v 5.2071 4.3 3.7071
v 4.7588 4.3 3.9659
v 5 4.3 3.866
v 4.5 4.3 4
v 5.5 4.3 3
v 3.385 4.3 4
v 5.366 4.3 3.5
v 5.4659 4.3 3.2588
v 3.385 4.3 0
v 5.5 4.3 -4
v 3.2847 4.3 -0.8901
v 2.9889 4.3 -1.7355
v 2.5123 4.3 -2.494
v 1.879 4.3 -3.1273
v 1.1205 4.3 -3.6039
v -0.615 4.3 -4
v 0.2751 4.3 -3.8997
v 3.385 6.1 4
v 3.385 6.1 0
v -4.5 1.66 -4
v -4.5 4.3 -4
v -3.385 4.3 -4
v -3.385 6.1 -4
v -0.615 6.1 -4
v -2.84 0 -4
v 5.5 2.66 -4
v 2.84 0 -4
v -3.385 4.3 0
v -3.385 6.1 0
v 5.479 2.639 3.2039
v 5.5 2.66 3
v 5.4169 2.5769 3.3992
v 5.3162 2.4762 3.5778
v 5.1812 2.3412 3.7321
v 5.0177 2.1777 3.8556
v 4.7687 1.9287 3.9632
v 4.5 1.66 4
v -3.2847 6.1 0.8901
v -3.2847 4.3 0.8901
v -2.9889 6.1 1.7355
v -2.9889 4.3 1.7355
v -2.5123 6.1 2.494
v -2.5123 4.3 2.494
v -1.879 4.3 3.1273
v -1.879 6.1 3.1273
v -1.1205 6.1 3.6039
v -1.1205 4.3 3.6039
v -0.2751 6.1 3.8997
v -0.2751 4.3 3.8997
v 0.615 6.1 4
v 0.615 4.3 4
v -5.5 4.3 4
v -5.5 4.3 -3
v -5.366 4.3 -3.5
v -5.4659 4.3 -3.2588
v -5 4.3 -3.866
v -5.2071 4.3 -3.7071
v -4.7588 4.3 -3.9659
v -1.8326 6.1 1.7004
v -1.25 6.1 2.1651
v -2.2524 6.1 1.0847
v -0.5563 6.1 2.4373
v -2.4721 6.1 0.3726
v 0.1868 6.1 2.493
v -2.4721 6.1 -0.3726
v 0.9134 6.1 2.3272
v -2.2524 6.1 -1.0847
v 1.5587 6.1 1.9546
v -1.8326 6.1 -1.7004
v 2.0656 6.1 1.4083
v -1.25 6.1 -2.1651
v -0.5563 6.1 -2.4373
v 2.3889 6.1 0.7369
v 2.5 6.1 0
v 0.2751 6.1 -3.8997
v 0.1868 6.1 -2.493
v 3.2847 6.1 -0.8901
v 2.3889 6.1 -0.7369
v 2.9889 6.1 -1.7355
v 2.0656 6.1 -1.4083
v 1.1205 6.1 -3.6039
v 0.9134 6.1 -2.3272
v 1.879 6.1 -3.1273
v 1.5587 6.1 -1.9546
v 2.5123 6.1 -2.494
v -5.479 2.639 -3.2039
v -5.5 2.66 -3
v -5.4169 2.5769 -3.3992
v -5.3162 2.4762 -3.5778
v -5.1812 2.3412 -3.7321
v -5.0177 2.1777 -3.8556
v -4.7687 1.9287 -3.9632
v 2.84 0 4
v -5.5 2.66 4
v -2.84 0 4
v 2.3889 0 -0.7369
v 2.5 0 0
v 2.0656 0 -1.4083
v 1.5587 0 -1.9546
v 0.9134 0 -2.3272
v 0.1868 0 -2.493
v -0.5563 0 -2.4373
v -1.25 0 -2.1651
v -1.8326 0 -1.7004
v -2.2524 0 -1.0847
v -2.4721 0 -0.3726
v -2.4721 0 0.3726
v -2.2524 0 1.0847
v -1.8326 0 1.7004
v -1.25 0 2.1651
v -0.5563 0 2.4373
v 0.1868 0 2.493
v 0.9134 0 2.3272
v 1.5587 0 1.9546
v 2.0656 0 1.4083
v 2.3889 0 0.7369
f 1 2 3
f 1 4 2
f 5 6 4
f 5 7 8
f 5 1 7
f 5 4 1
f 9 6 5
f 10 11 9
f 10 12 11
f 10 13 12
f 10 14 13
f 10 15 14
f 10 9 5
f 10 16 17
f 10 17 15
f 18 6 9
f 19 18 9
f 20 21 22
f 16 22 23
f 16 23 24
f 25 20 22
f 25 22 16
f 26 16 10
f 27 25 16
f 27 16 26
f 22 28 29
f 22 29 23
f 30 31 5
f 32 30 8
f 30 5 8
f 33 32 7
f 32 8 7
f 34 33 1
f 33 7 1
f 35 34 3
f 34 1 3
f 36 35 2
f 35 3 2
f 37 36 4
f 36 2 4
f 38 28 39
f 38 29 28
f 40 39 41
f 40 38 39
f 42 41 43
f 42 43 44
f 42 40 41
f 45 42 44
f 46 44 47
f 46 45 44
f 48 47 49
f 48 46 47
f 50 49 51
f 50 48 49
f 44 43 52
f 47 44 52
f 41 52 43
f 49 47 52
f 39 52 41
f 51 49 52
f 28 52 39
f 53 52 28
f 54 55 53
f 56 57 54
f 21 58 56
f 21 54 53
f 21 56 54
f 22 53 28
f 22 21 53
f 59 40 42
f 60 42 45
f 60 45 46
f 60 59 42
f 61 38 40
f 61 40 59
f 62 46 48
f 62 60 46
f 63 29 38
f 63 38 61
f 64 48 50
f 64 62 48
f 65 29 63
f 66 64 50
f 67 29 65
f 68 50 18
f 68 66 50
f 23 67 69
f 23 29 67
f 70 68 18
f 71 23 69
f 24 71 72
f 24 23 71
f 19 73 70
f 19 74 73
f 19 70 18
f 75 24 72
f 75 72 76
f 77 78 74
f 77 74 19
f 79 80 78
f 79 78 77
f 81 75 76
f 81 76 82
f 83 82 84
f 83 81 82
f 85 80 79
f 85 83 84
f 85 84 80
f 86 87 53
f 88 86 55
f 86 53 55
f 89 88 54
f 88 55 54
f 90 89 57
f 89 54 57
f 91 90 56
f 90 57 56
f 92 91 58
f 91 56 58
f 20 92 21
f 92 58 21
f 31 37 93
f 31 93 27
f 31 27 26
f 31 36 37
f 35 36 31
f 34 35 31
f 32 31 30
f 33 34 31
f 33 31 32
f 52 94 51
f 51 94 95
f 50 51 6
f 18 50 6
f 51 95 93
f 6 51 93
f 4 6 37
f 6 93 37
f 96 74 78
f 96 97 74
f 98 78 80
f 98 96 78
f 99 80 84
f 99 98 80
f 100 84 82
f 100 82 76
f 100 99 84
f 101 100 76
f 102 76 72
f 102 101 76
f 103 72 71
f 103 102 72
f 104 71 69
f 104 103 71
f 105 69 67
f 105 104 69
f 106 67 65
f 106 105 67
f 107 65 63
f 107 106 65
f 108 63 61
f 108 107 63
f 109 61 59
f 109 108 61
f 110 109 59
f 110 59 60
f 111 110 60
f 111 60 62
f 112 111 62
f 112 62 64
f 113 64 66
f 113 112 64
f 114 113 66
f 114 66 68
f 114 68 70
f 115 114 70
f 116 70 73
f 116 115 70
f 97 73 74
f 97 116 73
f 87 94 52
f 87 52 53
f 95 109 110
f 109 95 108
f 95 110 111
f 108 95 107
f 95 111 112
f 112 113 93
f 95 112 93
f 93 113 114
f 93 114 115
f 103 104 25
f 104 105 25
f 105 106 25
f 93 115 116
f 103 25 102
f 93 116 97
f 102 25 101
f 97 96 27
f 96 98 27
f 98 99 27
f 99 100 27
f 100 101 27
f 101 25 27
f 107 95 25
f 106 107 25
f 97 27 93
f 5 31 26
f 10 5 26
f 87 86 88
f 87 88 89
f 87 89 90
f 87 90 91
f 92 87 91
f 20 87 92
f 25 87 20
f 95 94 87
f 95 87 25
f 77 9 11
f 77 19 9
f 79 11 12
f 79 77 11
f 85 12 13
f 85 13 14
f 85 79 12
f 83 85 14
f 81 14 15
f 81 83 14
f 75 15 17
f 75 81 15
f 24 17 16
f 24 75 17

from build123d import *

# Parameters (mm, degrees)
SKETCH1_W           = 11
SKETCH1_H           = 8
SKETCH1_R           = 2.5
BOSS_EXTRUDE1_DEPTH = 4.3
CUT_EXTRUDE1_DEPTH  = 9
SKETCH3_W           = 6.77
SKETCH3_H           = 8
SKETCH3_R           = 2.5
BOSS_EXTRUDE2_DEPTH = 1.8
FILLET1_R           = 4
FILLET2_R           = 1


with BuildPart() as part:
    # Sketch1 → Boss-Extrude1 (new body)
    with BuildSketch(Plane(origin=(0, 0, 0), x_dir=(1, 0, 0), z_dir=(0, 1, 0))):
        Rectangle(SKETCH1_W, SKETCH1_H)
        Circle(SKETCH1_R, mode=Mode.SUBTRACT)
    extrude(amount=BOSS_EXTRUDE1_DEPTH)

    # Sketch2 → Cut-Extrude1 (cut, through all)
    with BuildSketch(Plane.XY.offset(4)):
        Polygon((-5.5, 2.66), (-2.84, 0), (-5.5, 0), align=None)
        Polygon((5.5, 2.66), (5.5, 0), (2.84, 0), align=None)
    extrude(amount=-CUT_EXTRUDE1_DEPTH, mode=Mode.SUBTRACT)

    # Sketch3 → Boss-Extrude2 (add)
    with BuildSketch(Plane(origin=(0, 4.3, 0), x_dir=(1, 0, 0), z_dir=(0, 1, 0))):
        Rectangle(SKETCH3_W, SKETCH3_H)
        Circle(SKETCH3_R, mode=Mode.SUBTRACT)
    extrude(amount=BOSS_EXTRUDE2_DEPTH)

    # Fillet1
    fillet1_edges = [part.edges().sort_by_distance(p)[0] for p in [
        (3.385, 5.2, -4),
        (-3.385, 5.2, 4),
    ]]
    fillet(fillet1_edges, radius=FILLET1_R)

    # Fillet2
    fillet2_edges = [part.edges().sort_by_distance(p)[0] for p in [
        (5.5, 3.48, 4),
        (-5.5, 3.48, -4),
    ]]
    fillet(fillet2_edges, radius=FILLET2_R)


solid = part.part
